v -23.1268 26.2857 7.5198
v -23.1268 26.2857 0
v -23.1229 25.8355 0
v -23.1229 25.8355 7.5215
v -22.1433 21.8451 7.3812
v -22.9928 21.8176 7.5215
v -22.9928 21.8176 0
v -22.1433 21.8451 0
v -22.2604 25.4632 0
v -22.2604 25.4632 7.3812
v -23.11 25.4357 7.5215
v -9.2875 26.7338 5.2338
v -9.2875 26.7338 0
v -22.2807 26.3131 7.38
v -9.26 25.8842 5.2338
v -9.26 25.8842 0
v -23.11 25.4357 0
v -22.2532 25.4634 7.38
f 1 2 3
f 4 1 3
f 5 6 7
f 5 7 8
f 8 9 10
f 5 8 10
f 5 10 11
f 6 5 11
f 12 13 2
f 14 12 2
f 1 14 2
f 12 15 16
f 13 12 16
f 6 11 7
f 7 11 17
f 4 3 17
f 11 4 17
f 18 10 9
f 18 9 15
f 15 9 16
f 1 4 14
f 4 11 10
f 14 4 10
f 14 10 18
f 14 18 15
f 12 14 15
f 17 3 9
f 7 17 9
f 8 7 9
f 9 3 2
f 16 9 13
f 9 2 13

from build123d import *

# Parameters (mm, degrees)
F1_DEPTH      = 11.4
F3_DEPTH      = 25
F5_DEPTH      = 12.5
F7_DEPTH      = 3.62
F9_DEPTH      = 25
F9_DEPTH_BACK = 49.7


with BuildPart() as f1:
    # F0 (on Top) → F1 (new body)
    with BuildSketch(Plane.XY):
        with BuildLine():
            Line((0, 21.6441951712), (18.1235127774, 0))
            Line((18.1235127774, 0), (18.4301963788, 0.256797914))
            Line((18.4301963788, 0.256797914), (0.3066836014, 21.9009930852))
            ThreePointArc((0.3066836014, 21.9009930852), (-3.986202338, 25.1744521896), (-9.269486464, 26.2840976478))
            Line((-9.269486464, 26.2840976478), (-23.1229464174, 25.8354809233))
            Line((-23.1229464174, 25.8354809233), (-23.11, 25.4356904904))
            Line((-23.11, 25.4356904904), (-9.26, 25.8841951712))
            ThreePointArc((-9.26, 25.8841951712), (-4.1511288202, 24.8100317574), (0, 21.6441951712))
        make_face()
        Polygon((-23.1229464174, 25.8354809233), (-9.269486464, 26.2840976478), (-9.2840532536, 26.7339258093), (-23.1267969944, 26.285656108), align=None)
    extrude(amount=F1_DEPTH)

    # F2 (on face) → F3 (cut)
    with BuildSketch(Plane(origin=(10.6537746153, 8.9208131252, 0), x_dir=(0.6419947849, -0.7667090036, 0), z_dir=(-0.7667090036, -0.6419947849, 0))):
        Polygon((-16.5947993131, 4.18), (11.6352006869, 1.35), (11.6352006869, 11.4), (-16.5947993131, 11.4), align=None)
    extrude(amount=-F3_DEPTH, mode=Mode.SUBTRACT)

    # F4 (on face) → F5 (cut, symmetric)
    with BuildSketch(Plane(origin=(-0.8470304755, 26.1566324428, 0), x_dir=(0.9994760824, 0.0323660434, 0), z_dir=(0.0323660434, -0.9994760824, 0))):
        Polygon((-22.2746396009, 7.5215270421), (-21.4173795381, 7.38), (-21.4173795381, 11.4), (-22.2746396009, 11.4), align=None)
        Polygon((-21.4173795381, 7.38), (-8.4173795381, 5.2338), (-8.4173795381, 11.4), (-21.4173795381, 11.4), align=None)
        Polygon((-8.4173795381, 11.4), (-8.4173795381, 5.2338), (0.7005369606, 4.18), (0.7005369606, 11.4), align=None)
        Polygon((0.7005369606, 11.4), (0.7005369606, 4.18), (18.1140175495, 1.35), (18.1140175495, 8.57), (18.1140175495, 11.4), align=None)
    extrude(amount=F5_DEPTH, both=True, mode=Mode.SUBTRACT)

    # F6 (on face) → F7 (join)
    with BuildSketch(Plane(origin=(-0.8470304755, 26.1566324428, 0), x_dir=(0.9994760824, 0.0323660434, 0), z_dir=(0.0323660434, -0.9994760824, 0))):
        Polygon((-22.2746396009, 7.5215270421), (-22.2746396009, 0), (-21.4246396009, 0), (-21.4246396009, 7.3811985805), align=None)
    extrude(amount=F7_DEPTH)

    # F8 (on face) → F9 (cut, two sides)
    with BuildSketch(Plane(origin=(-0.8470304755, 26.1566324428, 0), x_dir=(0.9994760824, 0.0323660434, 0), z_dir=(0.0323660434, -0.9994760824, 0))) as f9_sk:
        Polygon((-8.4173795381, 5.2338), (-8.4173795381, 0), (-8.4173795381, -8.5982028395), (53.2149014449, -45.262684235), (51.573908383, 51.0224351168), (-8.4173795381, 50), align=None)
    extrude(amount=-F9_DEPTH, mode=Mode.SUBTRACT)
    extrude(f9_sk.sketch, amount=F9_DEPTH_BACK, mode=Mode.SUBTRACT)


solid = f1.part
